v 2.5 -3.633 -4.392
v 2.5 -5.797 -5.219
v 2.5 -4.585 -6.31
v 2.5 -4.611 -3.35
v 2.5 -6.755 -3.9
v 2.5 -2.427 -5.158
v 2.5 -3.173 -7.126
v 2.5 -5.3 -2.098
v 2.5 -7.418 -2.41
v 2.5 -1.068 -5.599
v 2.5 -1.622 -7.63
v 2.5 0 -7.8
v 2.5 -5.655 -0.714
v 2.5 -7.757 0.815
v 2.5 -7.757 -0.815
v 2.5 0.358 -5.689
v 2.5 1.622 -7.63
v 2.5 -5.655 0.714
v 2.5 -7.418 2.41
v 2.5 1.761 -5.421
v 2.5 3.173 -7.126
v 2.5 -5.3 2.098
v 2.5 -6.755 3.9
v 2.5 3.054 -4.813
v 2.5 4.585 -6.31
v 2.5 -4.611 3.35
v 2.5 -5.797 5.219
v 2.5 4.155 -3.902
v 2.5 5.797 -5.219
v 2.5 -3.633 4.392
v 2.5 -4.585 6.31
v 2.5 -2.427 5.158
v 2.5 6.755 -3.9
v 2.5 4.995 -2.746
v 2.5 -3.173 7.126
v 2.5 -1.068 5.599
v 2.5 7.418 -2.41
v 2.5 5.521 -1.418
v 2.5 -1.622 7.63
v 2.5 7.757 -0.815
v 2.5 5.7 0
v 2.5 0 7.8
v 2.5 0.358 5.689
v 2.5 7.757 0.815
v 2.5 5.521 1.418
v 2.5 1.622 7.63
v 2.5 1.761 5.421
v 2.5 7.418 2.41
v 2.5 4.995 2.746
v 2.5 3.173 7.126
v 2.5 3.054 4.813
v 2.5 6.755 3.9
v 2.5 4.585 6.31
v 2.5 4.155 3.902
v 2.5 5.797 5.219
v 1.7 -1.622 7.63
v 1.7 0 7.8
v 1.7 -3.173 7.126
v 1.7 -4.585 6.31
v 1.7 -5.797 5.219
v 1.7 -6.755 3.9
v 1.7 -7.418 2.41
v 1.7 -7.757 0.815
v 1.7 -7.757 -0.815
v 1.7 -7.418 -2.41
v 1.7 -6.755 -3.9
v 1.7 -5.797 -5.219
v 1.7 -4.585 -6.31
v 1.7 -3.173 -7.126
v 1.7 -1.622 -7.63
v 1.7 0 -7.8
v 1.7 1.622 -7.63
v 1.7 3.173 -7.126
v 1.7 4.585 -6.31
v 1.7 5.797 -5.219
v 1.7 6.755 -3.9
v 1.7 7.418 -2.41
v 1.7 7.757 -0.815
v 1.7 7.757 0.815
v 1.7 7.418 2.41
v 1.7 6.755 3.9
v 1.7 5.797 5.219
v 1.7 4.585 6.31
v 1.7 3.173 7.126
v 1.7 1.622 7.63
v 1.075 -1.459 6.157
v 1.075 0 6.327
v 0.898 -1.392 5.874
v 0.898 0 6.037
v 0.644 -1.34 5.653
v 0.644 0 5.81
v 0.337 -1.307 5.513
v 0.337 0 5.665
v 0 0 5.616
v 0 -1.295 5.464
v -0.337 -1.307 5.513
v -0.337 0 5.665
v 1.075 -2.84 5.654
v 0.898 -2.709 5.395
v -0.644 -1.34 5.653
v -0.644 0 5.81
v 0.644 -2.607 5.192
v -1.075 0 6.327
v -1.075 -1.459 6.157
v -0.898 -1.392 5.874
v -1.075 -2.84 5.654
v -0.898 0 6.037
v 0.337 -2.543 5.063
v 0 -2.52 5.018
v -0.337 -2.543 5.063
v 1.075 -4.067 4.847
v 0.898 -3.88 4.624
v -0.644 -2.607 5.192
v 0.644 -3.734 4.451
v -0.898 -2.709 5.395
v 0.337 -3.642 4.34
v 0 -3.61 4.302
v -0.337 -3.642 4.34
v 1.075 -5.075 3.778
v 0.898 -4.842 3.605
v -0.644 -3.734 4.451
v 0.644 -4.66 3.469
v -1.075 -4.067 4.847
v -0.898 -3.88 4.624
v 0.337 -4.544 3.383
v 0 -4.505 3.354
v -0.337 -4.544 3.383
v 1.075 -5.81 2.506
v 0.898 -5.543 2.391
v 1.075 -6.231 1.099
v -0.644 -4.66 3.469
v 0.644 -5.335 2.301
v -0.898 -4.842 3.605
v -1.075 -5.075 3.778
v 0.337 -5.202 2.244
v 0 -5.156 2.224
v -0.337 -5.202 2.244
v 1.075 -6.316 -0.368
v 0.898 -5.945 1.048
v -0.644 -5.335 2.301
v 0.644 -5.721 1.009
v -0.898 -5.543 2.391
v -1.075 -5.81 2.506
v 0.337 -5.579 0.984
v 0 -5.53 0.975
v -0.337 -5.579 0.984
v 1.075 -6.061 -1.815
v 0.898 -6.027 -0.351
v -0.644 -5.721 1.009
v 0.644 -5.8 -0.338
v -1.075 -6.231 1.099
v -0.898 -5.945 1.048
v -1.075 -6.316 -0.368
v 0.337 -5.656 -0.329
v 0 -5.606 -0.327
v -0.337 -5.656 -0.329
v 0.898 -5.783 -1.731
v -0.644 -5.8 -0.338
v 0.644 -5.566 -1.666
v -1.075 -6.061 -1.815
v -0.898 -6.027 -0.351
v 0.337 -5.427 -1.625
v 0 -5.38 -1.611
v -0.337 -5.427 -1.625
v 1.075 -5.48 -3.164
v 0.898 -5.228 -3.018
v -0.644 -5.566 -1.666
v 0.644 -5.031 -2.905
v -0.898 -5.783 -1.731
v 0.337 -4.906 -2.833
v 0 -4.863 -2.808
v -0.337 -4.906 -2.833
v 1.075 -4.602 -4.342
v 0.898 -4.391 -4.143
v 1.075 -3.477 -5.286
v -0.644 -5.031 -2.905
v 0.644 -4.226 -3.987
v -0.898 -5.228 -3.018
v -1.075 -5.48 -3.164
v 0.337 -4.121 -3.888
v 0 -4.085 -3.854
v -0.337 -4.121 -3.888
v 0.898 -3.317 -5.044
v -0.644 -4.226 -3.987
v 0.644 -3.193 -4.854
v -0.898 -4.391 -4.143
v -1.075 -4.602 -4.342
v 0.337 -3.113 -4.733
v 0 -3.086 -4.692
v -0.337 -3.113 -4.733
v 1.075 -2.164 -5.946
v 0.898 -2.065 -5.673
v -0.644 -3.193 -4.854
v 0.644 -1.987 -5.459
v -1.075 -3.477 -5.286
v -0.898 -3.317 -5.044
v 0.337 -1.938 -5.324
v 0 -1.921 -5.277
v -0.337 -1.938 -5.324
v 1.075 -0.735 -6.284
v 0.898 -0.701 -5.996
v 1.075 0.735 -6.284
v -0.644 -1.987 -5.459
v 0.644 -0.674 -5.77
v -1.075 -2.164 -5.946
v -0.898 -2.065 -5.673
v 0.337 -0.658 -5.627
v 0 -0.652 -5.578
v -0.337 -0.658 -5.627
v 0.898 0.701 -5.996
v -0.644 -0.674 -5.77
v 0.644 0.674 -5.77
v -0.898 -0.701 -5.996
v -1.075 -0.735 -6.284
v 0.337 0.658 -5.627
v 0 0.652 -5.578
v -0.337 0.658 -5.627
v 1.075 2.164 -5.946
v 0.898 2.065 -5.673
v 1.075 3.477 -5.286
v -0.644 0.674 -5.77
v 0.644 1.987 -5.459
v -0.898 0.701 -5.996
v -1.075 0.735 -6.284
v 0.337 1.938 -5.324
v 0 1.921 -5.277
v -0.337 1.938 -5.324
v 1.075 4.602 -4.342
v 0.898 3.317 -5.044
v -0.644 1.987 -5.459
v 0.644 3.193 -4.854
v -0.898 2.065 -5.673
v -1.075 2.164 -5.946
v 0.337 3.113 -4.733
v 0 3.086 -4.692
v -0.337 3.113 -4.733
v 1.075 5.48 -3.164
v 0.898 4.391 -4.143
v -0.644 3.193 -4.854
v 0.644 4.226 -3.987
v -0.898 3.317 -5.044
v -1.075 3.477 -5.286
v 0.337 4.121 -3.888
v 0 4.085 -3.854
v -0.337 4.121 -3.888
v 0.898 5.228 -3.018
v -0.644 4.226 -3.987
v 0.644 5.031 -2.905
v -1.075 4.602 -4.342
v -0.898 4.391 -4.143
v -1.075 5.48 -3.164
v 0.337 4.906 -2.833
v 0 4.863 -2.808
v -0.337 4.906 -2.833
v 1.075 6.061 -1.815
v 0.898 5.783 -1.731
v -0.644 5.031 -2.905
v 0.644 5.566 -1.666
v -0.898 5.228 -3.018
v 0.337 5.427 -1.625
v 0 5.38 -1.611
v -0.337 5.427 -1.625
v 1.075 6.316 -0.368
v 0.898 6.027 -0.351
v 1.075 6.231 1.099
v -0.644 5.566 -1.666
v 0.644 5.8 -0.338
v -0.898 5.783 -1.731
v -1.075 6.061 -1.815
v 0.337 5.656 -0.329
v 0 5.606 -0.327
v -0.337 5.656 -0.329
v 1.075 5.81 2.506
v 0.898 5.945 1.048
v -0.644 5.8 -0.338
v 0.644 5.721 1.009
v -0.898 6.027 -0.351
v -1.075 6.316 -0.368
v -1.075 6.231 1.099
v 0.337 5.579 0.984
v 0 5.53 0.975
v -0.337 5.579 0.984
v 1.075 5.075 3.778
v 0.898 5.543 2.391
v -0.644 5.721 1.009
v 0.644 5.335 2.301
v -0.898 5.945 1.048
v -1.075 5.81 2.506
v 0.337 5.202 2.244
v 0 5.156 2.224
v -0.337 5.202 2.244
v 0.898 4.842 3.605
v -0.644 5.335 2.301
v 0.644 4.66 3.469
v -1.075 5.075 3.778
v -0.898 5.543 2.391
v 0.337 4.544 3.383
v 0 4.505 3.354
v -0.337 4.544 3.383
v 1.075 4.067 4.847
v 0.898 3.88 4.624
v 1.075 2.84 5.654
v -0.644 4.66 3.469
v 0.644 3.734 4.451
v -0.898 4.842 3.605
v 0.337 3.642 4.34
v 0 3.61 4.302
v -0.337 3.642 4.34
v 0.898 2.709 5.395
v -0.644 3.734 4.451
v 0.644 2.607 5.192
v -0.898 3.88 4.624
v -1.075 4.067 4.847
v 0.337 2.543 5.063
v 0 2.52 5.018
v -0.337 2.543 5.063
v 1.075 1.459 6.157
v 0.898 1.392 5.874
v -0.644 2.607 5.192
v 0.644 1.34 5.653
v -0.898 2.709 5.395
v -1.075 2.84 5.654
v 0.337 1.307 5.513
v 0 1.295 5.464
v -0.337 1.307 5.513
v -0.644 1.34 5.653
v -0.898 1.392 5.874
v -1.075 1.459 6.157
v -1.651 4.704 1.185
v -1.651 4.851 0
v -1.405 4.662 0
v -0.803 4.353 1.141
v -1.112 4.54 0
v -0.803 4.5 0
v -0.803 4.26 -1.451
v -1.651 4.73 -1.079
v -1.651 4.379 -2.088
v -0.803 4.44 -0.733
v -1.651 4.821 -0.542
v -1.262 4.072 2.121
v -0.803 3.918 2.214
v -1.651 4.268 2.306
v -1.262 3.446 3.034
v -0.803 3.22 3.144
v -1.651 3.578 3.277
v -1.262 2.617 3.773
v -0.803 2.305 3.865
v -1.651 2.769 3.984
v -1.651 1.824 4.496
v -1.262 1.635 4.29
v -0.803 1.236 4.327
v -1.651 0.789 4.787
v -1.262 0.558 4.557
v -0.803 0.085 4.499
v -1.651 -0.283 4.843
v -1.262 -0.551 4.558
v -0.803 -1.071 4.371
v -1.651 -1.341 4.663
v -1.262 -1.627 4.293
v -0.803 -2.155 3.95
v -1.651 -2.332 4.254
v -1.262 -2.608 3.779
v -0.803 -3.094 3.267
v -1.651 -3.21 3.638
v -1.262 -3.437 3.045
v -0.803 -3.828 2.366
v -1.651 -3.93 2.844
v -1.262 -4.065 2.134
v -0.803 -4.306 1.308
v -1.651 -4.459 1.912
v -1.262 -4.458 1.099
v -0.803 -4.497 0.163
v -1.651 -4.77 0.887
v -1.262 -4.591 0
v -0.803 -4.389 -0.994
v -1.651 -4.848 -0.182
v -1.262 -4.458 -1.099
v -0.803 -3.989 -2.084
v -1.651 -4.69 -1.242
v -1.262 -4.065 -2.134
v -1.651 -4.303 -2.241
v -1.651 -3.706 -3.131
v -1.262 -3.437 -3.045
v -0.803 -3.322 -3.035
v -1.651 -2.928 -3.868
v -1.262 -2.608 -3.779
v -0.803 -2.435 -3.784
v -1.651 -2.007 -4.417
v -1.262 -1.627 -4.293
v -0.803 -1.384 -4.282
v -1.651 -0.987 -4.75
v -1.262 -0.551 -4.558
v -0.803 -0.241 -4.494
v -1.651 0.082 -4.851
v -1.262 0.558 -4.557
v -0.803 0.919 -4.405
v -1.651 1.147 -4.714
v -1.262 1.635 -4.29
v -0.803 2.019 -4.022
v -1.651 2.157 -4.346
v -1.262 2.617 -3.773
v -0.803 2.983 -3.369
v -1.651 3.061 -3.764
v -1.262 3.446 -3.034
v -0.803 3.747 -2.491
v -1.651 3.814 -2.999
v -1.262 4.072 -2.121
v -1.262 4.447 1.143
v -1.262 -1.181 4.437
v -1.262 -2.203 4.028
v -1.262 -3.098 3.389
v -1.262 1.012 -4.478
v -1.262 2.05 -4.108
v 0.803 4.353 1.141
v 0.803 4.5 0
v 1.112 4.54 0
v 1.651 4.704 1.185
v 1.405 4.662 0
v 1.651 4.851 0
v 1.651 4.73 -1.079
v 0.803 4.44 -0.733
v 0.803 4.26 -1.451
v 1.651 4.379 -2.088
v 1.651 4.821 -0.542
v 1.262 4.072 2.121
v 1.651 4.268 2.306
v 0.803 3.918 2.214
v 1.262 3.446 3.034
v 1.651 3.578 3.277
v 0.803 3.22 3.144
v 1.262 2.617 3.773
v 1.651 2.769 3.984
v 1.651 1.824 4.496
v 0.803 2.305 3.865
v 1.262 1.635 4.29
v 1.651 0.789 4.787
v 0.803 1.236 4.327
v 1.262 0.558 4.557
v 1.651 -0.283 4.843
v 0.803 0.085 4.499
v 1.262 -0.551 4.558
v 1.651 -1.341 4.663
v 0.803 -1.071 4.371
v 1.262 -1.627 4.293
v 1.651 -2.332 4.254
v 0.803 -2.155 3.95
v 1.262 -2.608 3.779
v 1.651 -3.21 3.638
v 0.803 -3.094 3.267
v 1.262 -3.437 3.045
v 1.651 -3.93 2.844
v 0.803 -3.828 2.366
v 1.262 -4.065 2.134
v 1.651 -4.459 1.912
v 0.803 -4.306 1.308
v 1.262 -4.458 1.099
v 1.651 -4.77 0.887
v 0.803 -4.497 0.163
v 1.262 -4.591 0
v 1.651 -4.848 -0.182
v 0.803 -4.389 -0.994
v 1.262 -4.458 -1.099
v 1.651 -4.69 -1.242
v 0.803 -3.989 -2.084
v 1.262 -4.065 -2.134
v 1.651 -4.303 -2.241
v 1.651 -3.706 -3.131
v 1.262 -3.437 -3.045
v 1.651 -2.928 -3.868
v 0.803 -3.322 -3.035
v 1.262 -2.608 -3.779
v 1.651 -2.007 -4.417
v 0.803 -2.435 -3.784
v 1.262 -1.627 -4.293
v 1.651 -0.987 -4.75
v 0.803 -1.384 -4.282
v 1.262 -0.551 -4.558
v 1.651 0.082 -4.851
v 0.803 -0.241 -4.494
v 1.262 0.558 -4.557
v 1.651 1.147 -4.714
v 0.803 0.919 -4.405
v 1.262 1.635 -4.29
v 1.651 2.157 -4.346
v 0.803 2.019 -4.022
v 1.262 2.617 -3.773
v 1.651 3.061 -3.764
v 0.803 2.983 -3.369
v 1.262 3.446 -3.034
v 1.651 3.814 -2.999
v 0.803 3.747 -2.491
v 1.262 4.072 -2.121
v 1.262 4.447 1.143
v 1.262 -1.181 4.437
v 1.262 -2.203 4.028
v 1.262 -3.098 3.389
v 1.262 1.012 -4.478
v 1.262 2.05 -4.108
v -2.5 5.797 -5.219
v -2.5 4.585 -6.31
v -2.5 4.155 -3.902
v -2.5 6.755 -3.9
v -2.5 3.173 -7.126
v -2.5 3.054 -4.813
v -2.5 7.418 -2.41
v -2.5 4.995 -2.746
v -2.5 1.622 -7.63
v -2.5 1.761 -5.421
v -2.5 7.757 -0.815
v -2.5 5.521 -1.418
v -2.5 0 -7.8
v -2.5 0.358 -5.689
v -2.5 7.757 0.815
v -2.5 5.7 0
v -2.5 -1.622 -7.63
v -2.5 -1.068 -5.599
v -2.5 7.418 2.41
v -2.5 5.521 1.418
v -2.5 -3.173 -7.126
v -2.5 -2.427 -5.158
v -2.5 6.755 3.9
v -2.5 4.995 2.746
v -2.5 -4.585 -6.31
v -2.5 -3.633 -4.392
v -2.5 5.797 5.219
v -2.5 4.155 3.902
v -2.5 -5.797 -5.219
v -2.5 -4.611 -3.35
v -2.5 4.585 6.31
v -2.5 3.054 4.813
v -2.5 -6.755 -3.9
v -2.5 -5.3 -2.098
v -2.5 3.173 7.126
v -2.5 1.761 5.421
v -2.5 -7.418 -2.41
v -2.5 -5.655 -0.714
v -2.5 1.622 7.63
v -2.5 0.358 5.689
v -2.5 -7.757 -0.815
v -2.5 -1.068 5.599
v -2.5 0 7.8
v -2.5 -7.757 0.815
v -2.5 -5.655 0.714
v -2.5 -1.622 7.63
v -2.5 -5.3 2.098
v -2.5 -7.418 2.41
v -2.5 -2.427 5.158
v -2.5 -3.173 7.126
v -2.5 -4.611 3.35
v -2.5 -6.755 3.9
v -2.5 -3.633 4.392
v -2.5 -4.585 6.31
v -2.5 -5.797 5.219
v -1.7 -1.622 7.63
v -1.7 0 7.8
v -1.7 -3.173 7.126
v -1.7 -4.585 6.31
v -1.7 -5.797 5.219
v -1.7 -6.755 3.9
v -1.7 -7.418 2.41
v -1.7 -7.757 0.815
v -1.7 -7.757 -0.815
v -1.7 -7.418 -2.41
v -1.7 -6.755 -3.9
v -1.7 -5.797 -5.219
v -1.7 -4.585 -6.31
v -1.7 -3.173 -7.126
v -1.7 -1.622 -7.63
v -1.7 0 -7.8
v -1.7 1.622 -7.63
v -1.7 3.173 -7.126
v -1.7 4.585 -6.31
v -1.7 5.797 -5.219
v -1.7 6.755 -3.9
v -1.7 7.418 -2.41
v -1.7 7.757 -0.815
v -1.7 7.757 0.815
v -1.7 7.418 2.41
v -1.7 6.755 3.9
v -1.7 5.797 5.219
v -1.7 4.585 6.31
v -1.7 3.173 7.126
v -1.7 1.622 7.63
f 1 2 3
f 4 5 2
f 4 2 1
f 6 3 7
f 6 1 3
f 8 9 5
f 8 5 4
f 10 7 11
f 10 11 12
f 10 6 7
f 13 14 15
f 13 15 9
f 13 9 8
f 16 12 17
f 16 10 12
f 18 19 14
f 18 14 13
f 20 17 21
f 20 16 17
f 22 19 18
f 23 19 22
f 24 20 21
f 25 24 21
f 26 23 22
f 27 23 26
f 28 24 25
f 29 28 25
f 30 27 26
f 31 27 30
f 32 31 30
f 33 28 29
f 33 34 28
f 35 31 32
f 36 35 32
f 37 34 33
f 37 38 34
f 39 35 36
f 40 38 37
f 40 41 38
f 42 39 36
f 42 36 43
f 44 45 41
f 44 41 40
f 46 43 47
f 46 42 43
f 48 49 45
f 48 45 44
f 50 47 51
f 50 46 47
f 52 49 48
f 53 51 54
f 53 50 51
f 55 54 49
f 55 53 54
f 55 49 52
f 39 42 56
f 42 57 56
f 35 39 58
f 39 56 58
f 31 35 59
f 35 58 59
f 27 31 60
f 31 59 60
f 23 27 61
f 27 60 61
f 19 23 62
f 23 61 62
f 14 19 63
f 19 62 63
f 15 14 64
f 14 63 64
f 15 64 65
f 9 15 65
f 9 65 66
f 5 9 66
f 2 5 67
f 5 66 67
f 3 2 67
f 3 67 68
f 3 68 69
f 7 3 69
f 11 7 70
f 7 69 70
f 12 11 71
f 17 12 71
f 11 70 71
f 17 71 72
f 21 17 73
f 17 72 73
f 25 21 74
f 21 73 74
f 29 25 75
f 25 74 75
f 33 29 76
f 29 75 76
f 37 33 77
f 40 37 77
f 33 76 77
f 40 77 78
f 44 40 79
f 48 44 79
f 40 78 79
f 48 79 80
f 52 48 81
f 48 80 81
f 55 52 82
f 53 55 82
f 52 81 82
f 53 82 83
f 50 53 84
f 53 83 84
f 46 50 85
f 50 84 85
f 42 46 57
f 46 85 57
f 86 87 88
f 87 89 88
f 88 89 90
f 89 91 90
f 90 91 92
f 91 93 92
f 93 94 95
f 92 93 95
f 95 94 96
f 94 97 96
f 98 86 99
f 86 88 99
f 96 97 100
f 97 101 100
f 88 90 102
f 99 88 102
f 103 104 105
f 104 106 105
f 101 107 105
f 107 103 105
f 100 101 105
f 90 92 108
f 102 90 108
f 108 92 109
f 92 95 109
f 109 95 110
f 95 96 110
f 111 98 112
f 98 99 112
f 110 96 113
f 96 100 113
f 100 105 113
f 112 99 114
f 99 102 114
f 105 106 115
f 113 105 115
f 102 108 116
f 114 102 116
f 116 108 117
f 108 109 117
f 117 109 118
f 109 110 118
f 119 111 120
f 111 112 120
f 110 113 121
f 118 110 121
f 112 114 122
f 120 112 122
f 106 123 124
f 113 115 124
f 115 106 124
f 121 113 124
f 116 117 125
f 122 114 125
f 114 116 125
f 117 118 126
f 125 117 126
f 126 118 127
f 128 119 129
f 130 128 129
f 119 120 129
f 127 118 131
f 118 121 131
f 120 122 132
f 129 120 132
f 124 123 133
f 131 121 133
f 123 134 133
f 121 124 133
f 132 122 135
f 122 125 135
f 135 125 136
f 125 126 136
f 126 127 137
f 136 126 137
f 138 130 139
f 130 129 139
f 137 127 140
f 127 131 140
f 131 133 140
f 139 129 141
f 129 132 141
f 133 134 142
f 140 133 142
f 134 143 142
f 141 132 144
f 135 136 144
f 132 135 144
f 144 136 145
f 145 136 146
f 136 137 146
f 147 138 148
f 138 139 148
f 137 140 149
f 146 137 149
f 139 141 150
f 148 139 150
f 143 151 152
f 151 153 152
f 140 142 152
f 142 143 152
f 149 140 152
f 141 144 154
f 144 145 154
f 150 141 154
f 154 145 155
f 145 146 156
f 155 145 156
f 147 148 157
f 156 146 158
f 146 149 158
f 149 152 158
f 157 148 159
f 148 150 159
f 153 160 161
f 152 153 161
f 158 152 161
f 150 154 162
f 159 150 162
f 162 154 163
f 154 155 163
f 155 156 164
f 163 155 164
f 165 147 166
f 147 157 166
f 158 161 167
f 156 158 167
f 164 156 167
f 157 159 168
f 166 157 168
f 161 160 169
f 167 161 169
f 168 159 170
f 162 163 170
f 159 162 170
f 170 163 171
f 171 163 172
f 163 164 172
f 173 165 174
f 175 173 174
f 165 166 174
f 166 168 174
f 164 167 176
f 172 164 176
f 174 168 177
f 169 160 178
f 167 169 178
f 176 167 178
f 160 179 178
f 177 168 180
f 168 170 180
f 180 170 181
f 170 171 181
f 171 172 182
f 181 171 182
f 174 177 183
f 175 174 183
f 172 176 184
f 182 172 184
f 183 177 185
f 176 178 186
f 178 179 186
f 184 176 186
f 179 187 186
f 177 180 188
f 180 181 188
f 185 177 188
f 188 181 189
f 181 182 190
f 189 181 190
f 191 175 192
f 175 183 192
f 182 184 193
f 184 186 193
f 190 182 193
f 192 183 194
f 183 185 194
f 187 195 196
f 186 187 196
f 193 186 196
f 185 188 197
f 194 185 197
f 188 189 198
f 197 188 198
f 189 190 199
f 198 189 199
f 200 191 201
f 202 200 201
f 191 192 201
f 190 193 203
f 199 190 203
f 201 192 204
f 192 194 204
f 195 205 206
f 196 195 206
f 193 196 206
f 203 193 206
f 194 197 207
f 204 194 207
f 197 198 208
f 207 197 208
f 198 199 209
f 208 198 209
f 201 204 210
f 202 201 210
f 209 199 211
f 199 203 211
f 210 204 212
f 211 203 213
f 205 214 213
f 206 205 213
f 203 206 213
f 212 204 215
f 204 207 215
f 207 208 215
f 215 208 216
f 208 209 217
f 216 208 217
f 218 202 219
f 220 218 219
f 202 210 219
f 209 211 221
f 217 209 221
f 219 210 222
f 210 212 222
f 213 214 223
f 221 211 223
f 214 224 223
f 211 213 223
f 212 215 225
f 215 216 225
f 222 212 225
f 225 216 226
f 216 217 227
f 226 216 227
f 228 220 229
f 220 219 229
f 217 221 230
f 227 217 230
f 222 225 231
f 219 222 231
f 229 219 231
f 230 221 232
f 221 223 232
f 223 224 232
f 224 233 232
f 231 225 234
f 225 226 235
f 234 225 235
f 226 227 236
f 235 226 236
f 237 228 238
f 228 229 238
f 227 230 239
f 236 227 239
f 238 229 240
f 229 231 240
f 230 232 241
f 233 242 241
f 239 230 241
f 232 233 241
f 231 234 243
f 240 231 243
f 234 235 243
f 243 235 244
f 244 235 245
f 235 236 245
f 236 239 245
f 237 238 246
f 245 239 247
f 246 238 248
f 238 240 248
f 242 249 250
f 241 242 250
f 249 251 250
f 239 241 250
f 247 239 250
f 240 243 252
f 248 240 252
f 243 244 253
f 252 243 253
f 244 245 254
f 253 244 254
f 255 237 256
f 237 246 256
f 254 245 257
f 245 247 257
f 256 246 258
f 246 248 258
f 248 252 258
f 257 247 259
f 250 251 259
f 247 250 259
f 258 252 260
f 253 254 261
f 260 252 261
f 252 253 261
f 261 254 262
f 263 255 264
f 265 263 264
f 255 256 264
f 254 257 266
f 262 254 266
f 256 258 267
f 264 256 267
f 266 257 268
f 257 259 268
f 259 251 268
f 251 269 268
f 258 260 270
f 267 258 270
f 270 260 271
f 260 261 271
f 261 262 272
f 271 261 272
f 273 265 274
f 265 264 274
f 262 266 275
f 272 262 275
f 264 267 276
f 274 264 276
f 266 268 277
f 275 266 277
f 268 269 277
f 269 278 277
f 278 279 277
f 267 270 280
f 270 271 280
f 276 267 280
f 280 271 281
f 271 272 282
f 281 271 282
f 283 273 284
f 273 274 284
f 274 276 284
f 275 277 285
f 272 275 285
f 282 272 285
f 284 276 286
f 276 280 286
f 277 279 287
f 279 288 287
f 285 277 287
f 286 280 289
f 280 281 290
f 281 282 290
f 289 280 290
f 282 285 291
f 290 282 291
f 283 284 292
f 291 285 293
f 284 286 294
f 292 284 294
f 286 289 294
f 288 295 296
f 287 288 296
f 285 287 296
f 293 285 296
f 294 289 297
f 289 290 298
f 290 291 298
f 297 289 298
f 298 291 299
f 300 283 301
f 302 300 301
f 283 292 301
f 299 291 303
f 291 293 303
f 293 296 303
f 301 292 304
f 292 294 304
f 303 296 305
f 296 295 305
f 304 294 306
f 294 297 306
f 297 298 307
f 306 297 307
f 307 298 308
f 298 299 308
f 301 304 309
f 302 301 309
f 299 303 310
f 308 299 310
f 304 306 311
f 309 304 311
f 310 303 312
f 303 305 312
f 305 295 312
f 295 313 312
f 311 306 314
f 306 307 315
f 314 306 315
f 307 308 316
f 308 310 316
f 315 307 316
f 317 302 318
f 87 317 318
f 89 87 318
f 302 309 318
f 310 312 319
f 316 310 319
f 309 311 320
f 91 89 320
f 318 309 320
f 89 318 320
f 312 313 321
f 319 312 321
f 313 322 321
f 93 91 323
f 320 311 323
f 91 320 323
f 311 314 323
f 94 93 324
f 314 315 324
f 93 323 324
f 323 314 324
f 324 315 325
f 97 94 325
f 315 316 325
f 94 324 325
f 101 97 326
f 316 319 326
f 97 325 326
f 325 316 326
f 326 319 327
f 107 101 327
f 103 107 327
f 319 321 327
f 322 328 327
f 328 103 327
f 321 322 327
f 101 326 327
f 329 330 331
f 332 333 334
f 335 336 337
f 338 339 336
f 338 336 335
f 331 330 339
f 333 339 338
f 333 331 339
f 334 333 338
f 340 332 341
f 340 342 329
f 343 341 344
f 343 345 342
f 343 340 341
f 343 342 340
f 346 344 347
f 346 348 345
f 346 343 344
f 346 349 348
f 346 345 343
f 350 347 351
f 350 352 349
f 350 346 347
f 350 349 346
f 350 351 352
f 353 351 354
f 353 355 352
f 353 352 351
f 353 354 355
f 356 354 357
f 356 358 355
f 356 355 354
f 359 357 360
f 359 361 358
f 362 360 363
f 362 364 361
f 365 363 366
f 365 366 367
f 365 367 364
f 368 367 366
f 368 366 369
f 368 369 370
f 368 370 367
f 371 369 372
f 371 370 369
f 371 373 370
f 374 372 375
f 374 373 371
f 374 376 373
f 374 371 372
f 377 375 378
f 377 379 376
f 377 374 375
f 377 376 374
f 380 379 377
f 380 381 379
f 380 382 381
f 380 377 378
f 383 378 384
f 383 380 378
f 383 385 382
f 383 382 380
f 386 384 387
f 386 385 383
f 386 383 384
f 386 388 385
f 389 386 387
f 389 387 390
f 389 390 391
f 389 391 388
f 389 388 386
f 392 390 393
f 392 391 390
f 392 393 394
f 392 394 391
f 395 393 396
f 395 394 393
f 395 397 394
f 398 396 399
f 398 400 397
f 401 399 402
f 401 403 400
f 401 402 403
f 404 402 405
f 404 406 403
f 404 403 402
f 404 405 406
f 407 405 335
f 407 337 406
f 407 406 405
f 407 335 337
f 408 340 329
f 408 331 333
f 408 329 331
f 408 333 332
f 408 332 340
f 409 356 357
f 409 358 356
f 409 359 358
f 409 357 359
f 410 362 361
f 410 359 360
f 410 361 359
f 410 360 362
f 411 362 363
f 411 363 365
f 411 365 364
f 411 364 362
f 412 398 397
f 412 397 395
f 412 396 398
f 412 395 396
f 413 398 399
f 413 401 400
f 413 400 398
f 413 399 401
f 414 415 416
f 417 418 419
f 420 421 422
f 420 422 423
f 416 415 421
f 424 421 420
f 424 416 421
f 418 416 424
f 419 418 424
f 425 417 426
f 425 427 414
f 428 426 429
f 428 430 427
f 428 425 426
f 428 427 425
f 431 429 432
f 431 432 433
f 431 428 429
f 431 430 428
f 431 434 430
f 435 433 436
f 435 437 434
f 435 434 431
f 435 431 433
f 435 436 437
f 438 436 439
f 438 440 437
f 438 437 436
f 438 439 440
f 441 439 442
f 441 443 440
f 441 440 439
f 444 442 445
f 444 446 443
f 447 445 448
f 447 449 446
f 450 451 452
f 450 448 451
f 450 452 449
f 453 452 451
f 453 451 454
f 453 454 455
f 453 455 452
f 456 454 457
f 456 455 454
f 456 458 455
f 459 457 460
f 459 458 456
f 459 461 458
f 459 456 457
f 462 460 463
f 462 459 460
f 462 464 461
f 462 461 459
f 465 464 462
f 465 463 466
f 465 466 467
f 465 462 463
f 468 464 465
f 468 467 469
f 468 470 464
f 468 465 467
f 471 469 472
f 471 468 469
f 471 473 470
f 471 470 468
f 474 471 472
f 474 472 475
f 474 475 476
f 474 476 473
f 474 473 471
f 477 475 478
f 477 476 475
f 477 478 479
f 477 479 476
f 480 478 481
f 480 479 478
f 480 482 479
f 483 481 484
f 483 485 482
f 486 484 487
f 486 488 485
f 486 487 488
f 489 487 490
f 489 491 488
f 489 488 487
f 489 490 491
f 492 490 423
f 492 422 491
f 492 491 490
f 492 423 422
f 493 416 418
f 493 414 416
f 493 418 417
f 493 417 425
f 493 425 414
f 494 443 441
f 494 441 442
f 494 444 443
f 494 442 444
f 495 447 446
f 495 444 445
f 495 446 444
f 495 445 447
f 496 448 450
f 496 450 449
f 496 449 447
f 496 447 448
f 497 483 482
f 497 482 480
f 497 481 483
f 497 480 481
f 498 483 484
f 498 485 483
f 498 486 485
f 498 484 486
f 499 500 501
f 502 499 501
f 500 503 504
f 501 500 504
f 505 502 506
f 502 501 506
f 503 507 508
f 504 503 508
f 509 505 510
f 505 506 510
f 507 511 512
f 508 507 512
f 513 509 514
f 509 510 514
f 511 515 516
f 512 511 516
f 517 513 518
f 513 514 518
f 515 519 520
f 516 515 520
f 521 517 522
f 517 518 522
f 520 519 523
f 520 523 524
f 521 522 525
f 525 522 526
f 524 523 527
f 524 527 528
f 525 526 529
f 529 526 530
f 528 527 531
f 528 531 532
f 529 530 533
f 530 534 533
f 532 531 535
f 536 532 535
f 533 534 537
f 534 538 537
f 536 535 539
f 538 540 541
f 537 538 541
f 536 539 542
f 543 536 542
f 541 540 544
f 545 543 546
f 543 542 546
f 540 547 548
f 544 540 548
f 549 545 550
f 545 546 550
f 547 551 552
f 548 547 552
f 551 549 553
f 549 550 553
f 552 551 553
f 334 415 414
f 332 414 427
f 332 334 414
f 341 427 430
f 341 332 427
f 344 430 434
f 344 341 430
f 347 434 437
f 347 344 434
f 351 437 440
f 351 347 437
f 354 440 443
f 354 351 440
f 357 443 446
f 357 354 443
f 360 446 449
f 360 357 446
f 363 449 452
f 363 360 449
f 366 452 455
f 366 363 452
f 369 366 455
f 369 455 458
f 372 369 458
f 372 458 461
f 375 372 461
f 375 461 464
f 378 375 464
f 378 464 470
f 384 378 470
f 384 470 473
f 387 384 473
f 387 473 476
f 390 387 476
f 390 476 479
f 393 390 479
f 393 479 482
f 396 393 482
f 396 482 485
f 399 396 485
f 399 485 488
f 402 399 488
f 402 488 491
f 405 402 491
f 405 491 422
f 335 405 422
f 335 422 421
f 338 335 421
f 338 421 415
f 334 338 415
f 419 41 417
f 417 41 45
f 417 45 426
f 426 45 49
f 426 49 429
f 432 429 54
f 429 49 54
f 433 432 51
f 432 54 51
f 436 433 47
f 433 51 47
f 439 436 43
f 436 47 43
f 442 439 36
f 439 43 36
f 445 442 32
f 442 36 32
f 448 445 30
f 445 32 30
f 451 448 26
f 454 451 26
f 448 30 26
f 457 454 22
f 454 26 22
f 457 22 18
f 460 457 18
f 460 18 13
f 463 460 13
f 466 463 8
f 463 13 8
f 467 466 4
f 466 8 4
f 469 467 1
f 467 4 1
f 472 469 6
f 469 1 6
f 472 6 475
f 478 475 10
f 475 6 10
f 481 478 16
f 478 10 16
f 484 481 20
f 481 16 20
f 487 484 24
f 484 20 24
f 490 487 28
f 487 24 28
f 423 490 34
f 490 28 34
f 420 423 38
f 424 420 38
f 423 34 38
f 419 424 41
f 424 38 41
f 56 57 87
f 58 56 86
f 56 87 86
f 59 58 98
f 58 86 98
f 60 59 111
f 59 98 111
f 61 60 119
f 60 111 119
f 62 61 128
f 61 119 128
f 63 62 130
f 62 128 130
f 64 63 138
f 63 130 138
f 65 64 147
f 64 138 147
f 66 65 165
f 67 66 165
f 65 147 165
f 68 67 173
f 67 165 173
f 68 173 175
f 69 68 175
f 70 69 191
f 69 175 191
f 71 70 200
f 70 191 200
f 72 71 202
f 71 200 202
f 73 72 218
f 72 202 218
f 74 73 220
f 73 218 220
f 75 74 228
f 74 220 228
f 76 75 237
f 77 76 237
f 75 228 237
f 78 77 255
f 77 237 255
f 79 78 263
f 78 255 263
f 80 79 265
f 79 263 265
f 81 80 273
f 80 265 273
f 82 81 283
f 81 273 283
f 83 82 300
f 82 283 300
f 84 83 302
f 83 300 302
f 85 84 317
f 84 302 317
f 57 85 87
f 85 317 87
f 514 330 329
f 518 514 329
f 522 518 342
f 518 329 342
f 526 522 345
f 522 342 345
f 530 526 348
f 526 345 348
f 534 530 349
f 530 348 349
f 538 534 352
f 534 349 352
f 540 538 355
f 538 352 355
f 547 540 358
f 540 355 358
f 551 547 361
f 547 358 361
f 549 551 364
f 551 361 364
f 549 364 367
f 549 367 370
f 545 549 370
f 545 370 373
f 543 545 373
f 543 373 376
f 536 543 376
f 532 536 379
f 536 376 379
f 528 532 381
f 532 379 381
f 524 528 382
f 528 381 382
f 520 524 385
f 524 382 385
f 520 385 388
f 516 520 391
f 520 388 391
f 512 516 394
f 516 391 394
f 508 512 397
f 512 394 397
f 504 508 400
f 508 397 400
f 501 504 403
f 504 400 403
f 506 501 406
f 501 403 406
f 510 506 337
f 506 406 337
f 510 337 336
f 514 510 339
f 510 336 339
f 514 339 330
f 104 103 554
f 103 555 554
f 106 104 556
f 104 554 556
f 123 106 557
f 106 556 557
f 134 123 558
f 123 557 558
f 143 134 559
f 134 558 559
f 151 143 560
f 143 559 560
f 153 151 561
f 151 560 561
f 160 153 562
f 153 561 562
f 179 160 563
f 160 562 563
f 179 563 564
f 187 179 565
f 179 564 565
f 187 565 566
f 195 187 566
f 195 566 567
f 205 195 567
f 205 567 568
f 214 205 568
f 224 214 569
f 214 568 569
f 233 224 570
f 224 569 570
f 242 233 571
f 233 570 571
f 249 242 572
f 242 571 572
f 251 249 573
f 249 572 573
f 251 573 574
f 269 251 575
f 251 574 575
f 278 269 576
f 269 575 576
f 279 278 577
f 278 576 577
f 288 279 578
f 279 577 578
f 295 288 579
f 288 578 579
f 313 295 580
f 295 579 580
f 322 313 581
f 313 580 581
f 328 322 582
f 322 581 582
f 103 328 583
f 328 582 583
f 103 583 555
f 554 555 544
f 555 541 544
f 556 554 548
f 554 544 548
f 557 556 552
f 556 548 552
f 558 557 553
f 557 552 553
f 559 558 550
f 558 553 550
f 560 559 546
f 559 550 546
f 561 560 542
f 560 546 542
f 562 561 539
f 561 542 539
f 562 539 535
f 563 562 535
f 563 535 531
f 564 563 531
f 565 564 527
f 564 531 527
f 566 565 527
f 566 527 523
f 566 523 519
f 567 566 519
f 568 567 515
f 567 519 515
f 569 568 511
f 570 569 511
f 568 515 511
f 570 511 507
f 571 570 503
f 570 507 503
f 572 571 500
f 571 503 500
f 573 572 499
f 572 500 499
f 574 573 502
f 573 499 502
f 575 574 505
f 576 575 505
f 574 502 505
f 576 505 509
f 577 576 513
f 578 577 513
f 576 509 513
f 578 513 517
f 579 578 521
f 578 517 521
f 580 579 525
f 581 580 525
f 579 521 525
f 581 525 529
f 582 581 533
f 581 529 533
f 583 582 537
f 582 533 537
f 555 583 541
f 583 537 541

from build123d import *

# Parameters (mm, degrees)
F1_R     = 5
F1_R_2   = 4.5
F3_DEPTH = 2.5
F5_SIZE  = 1.2
F6_R     = 1.2


with BuildPart() as f3:
    # F1 (on Right) → F3 (new body, symmetric)
    with BuildSketch(Plane.YZ):
        Circle(F1_R)
        Circle(F1_R_2, mode=Mode.SUBTRACT)
    extrude(amount=F3_DEPTH, both=True)

    # F2 (on Front) → F4 (revolve)
    with BuildSketch(Plane.XZ):
        with BuildLine():
            Line((-2.5, 7.8), (-2.5, 5))
            Line((-2.5, 5), (0, 5))
            Line((0, 5), (2.5, 5))
            Line((2.5, 5), (2.5, 7.8))
            Line((2.5, 7.8), (1.7, 7.8))
            Line((1.7, 7.8), (1.0748301944, 6.3271922345))
            ThreePointArc((1.0748301944, 6.3271922345), (0, 5.6157776481), (-1.0748301944, 6.3271922345))
            Line((-1.0748301944, 6.3271922345), (-1.7, 7.8))
            Line((-1.7, 7.8), (-2.5, 7.8))
        make_face()
    revolve(axis=Axis((0, 0, 0), (1, 0, 0)))

    # F5
    f5_edges = [f3.edges().sort_by_distance(p)[0] for p in [
        (-2.5, -4.5, 0),
        (2.5, -4.5, 0),
    ]]
    chamfer(f5_edges, length=F5_SIZE)

    # F6
    f6_edges = [f3.edges().sort_by_distance(p)[0] for p in [
        (1.3, -4.5, 0),
        (-1.3, -4.5, 0),
    ]]
    fillet(f6_edges, radius=F6_R)


solid = f3.part
